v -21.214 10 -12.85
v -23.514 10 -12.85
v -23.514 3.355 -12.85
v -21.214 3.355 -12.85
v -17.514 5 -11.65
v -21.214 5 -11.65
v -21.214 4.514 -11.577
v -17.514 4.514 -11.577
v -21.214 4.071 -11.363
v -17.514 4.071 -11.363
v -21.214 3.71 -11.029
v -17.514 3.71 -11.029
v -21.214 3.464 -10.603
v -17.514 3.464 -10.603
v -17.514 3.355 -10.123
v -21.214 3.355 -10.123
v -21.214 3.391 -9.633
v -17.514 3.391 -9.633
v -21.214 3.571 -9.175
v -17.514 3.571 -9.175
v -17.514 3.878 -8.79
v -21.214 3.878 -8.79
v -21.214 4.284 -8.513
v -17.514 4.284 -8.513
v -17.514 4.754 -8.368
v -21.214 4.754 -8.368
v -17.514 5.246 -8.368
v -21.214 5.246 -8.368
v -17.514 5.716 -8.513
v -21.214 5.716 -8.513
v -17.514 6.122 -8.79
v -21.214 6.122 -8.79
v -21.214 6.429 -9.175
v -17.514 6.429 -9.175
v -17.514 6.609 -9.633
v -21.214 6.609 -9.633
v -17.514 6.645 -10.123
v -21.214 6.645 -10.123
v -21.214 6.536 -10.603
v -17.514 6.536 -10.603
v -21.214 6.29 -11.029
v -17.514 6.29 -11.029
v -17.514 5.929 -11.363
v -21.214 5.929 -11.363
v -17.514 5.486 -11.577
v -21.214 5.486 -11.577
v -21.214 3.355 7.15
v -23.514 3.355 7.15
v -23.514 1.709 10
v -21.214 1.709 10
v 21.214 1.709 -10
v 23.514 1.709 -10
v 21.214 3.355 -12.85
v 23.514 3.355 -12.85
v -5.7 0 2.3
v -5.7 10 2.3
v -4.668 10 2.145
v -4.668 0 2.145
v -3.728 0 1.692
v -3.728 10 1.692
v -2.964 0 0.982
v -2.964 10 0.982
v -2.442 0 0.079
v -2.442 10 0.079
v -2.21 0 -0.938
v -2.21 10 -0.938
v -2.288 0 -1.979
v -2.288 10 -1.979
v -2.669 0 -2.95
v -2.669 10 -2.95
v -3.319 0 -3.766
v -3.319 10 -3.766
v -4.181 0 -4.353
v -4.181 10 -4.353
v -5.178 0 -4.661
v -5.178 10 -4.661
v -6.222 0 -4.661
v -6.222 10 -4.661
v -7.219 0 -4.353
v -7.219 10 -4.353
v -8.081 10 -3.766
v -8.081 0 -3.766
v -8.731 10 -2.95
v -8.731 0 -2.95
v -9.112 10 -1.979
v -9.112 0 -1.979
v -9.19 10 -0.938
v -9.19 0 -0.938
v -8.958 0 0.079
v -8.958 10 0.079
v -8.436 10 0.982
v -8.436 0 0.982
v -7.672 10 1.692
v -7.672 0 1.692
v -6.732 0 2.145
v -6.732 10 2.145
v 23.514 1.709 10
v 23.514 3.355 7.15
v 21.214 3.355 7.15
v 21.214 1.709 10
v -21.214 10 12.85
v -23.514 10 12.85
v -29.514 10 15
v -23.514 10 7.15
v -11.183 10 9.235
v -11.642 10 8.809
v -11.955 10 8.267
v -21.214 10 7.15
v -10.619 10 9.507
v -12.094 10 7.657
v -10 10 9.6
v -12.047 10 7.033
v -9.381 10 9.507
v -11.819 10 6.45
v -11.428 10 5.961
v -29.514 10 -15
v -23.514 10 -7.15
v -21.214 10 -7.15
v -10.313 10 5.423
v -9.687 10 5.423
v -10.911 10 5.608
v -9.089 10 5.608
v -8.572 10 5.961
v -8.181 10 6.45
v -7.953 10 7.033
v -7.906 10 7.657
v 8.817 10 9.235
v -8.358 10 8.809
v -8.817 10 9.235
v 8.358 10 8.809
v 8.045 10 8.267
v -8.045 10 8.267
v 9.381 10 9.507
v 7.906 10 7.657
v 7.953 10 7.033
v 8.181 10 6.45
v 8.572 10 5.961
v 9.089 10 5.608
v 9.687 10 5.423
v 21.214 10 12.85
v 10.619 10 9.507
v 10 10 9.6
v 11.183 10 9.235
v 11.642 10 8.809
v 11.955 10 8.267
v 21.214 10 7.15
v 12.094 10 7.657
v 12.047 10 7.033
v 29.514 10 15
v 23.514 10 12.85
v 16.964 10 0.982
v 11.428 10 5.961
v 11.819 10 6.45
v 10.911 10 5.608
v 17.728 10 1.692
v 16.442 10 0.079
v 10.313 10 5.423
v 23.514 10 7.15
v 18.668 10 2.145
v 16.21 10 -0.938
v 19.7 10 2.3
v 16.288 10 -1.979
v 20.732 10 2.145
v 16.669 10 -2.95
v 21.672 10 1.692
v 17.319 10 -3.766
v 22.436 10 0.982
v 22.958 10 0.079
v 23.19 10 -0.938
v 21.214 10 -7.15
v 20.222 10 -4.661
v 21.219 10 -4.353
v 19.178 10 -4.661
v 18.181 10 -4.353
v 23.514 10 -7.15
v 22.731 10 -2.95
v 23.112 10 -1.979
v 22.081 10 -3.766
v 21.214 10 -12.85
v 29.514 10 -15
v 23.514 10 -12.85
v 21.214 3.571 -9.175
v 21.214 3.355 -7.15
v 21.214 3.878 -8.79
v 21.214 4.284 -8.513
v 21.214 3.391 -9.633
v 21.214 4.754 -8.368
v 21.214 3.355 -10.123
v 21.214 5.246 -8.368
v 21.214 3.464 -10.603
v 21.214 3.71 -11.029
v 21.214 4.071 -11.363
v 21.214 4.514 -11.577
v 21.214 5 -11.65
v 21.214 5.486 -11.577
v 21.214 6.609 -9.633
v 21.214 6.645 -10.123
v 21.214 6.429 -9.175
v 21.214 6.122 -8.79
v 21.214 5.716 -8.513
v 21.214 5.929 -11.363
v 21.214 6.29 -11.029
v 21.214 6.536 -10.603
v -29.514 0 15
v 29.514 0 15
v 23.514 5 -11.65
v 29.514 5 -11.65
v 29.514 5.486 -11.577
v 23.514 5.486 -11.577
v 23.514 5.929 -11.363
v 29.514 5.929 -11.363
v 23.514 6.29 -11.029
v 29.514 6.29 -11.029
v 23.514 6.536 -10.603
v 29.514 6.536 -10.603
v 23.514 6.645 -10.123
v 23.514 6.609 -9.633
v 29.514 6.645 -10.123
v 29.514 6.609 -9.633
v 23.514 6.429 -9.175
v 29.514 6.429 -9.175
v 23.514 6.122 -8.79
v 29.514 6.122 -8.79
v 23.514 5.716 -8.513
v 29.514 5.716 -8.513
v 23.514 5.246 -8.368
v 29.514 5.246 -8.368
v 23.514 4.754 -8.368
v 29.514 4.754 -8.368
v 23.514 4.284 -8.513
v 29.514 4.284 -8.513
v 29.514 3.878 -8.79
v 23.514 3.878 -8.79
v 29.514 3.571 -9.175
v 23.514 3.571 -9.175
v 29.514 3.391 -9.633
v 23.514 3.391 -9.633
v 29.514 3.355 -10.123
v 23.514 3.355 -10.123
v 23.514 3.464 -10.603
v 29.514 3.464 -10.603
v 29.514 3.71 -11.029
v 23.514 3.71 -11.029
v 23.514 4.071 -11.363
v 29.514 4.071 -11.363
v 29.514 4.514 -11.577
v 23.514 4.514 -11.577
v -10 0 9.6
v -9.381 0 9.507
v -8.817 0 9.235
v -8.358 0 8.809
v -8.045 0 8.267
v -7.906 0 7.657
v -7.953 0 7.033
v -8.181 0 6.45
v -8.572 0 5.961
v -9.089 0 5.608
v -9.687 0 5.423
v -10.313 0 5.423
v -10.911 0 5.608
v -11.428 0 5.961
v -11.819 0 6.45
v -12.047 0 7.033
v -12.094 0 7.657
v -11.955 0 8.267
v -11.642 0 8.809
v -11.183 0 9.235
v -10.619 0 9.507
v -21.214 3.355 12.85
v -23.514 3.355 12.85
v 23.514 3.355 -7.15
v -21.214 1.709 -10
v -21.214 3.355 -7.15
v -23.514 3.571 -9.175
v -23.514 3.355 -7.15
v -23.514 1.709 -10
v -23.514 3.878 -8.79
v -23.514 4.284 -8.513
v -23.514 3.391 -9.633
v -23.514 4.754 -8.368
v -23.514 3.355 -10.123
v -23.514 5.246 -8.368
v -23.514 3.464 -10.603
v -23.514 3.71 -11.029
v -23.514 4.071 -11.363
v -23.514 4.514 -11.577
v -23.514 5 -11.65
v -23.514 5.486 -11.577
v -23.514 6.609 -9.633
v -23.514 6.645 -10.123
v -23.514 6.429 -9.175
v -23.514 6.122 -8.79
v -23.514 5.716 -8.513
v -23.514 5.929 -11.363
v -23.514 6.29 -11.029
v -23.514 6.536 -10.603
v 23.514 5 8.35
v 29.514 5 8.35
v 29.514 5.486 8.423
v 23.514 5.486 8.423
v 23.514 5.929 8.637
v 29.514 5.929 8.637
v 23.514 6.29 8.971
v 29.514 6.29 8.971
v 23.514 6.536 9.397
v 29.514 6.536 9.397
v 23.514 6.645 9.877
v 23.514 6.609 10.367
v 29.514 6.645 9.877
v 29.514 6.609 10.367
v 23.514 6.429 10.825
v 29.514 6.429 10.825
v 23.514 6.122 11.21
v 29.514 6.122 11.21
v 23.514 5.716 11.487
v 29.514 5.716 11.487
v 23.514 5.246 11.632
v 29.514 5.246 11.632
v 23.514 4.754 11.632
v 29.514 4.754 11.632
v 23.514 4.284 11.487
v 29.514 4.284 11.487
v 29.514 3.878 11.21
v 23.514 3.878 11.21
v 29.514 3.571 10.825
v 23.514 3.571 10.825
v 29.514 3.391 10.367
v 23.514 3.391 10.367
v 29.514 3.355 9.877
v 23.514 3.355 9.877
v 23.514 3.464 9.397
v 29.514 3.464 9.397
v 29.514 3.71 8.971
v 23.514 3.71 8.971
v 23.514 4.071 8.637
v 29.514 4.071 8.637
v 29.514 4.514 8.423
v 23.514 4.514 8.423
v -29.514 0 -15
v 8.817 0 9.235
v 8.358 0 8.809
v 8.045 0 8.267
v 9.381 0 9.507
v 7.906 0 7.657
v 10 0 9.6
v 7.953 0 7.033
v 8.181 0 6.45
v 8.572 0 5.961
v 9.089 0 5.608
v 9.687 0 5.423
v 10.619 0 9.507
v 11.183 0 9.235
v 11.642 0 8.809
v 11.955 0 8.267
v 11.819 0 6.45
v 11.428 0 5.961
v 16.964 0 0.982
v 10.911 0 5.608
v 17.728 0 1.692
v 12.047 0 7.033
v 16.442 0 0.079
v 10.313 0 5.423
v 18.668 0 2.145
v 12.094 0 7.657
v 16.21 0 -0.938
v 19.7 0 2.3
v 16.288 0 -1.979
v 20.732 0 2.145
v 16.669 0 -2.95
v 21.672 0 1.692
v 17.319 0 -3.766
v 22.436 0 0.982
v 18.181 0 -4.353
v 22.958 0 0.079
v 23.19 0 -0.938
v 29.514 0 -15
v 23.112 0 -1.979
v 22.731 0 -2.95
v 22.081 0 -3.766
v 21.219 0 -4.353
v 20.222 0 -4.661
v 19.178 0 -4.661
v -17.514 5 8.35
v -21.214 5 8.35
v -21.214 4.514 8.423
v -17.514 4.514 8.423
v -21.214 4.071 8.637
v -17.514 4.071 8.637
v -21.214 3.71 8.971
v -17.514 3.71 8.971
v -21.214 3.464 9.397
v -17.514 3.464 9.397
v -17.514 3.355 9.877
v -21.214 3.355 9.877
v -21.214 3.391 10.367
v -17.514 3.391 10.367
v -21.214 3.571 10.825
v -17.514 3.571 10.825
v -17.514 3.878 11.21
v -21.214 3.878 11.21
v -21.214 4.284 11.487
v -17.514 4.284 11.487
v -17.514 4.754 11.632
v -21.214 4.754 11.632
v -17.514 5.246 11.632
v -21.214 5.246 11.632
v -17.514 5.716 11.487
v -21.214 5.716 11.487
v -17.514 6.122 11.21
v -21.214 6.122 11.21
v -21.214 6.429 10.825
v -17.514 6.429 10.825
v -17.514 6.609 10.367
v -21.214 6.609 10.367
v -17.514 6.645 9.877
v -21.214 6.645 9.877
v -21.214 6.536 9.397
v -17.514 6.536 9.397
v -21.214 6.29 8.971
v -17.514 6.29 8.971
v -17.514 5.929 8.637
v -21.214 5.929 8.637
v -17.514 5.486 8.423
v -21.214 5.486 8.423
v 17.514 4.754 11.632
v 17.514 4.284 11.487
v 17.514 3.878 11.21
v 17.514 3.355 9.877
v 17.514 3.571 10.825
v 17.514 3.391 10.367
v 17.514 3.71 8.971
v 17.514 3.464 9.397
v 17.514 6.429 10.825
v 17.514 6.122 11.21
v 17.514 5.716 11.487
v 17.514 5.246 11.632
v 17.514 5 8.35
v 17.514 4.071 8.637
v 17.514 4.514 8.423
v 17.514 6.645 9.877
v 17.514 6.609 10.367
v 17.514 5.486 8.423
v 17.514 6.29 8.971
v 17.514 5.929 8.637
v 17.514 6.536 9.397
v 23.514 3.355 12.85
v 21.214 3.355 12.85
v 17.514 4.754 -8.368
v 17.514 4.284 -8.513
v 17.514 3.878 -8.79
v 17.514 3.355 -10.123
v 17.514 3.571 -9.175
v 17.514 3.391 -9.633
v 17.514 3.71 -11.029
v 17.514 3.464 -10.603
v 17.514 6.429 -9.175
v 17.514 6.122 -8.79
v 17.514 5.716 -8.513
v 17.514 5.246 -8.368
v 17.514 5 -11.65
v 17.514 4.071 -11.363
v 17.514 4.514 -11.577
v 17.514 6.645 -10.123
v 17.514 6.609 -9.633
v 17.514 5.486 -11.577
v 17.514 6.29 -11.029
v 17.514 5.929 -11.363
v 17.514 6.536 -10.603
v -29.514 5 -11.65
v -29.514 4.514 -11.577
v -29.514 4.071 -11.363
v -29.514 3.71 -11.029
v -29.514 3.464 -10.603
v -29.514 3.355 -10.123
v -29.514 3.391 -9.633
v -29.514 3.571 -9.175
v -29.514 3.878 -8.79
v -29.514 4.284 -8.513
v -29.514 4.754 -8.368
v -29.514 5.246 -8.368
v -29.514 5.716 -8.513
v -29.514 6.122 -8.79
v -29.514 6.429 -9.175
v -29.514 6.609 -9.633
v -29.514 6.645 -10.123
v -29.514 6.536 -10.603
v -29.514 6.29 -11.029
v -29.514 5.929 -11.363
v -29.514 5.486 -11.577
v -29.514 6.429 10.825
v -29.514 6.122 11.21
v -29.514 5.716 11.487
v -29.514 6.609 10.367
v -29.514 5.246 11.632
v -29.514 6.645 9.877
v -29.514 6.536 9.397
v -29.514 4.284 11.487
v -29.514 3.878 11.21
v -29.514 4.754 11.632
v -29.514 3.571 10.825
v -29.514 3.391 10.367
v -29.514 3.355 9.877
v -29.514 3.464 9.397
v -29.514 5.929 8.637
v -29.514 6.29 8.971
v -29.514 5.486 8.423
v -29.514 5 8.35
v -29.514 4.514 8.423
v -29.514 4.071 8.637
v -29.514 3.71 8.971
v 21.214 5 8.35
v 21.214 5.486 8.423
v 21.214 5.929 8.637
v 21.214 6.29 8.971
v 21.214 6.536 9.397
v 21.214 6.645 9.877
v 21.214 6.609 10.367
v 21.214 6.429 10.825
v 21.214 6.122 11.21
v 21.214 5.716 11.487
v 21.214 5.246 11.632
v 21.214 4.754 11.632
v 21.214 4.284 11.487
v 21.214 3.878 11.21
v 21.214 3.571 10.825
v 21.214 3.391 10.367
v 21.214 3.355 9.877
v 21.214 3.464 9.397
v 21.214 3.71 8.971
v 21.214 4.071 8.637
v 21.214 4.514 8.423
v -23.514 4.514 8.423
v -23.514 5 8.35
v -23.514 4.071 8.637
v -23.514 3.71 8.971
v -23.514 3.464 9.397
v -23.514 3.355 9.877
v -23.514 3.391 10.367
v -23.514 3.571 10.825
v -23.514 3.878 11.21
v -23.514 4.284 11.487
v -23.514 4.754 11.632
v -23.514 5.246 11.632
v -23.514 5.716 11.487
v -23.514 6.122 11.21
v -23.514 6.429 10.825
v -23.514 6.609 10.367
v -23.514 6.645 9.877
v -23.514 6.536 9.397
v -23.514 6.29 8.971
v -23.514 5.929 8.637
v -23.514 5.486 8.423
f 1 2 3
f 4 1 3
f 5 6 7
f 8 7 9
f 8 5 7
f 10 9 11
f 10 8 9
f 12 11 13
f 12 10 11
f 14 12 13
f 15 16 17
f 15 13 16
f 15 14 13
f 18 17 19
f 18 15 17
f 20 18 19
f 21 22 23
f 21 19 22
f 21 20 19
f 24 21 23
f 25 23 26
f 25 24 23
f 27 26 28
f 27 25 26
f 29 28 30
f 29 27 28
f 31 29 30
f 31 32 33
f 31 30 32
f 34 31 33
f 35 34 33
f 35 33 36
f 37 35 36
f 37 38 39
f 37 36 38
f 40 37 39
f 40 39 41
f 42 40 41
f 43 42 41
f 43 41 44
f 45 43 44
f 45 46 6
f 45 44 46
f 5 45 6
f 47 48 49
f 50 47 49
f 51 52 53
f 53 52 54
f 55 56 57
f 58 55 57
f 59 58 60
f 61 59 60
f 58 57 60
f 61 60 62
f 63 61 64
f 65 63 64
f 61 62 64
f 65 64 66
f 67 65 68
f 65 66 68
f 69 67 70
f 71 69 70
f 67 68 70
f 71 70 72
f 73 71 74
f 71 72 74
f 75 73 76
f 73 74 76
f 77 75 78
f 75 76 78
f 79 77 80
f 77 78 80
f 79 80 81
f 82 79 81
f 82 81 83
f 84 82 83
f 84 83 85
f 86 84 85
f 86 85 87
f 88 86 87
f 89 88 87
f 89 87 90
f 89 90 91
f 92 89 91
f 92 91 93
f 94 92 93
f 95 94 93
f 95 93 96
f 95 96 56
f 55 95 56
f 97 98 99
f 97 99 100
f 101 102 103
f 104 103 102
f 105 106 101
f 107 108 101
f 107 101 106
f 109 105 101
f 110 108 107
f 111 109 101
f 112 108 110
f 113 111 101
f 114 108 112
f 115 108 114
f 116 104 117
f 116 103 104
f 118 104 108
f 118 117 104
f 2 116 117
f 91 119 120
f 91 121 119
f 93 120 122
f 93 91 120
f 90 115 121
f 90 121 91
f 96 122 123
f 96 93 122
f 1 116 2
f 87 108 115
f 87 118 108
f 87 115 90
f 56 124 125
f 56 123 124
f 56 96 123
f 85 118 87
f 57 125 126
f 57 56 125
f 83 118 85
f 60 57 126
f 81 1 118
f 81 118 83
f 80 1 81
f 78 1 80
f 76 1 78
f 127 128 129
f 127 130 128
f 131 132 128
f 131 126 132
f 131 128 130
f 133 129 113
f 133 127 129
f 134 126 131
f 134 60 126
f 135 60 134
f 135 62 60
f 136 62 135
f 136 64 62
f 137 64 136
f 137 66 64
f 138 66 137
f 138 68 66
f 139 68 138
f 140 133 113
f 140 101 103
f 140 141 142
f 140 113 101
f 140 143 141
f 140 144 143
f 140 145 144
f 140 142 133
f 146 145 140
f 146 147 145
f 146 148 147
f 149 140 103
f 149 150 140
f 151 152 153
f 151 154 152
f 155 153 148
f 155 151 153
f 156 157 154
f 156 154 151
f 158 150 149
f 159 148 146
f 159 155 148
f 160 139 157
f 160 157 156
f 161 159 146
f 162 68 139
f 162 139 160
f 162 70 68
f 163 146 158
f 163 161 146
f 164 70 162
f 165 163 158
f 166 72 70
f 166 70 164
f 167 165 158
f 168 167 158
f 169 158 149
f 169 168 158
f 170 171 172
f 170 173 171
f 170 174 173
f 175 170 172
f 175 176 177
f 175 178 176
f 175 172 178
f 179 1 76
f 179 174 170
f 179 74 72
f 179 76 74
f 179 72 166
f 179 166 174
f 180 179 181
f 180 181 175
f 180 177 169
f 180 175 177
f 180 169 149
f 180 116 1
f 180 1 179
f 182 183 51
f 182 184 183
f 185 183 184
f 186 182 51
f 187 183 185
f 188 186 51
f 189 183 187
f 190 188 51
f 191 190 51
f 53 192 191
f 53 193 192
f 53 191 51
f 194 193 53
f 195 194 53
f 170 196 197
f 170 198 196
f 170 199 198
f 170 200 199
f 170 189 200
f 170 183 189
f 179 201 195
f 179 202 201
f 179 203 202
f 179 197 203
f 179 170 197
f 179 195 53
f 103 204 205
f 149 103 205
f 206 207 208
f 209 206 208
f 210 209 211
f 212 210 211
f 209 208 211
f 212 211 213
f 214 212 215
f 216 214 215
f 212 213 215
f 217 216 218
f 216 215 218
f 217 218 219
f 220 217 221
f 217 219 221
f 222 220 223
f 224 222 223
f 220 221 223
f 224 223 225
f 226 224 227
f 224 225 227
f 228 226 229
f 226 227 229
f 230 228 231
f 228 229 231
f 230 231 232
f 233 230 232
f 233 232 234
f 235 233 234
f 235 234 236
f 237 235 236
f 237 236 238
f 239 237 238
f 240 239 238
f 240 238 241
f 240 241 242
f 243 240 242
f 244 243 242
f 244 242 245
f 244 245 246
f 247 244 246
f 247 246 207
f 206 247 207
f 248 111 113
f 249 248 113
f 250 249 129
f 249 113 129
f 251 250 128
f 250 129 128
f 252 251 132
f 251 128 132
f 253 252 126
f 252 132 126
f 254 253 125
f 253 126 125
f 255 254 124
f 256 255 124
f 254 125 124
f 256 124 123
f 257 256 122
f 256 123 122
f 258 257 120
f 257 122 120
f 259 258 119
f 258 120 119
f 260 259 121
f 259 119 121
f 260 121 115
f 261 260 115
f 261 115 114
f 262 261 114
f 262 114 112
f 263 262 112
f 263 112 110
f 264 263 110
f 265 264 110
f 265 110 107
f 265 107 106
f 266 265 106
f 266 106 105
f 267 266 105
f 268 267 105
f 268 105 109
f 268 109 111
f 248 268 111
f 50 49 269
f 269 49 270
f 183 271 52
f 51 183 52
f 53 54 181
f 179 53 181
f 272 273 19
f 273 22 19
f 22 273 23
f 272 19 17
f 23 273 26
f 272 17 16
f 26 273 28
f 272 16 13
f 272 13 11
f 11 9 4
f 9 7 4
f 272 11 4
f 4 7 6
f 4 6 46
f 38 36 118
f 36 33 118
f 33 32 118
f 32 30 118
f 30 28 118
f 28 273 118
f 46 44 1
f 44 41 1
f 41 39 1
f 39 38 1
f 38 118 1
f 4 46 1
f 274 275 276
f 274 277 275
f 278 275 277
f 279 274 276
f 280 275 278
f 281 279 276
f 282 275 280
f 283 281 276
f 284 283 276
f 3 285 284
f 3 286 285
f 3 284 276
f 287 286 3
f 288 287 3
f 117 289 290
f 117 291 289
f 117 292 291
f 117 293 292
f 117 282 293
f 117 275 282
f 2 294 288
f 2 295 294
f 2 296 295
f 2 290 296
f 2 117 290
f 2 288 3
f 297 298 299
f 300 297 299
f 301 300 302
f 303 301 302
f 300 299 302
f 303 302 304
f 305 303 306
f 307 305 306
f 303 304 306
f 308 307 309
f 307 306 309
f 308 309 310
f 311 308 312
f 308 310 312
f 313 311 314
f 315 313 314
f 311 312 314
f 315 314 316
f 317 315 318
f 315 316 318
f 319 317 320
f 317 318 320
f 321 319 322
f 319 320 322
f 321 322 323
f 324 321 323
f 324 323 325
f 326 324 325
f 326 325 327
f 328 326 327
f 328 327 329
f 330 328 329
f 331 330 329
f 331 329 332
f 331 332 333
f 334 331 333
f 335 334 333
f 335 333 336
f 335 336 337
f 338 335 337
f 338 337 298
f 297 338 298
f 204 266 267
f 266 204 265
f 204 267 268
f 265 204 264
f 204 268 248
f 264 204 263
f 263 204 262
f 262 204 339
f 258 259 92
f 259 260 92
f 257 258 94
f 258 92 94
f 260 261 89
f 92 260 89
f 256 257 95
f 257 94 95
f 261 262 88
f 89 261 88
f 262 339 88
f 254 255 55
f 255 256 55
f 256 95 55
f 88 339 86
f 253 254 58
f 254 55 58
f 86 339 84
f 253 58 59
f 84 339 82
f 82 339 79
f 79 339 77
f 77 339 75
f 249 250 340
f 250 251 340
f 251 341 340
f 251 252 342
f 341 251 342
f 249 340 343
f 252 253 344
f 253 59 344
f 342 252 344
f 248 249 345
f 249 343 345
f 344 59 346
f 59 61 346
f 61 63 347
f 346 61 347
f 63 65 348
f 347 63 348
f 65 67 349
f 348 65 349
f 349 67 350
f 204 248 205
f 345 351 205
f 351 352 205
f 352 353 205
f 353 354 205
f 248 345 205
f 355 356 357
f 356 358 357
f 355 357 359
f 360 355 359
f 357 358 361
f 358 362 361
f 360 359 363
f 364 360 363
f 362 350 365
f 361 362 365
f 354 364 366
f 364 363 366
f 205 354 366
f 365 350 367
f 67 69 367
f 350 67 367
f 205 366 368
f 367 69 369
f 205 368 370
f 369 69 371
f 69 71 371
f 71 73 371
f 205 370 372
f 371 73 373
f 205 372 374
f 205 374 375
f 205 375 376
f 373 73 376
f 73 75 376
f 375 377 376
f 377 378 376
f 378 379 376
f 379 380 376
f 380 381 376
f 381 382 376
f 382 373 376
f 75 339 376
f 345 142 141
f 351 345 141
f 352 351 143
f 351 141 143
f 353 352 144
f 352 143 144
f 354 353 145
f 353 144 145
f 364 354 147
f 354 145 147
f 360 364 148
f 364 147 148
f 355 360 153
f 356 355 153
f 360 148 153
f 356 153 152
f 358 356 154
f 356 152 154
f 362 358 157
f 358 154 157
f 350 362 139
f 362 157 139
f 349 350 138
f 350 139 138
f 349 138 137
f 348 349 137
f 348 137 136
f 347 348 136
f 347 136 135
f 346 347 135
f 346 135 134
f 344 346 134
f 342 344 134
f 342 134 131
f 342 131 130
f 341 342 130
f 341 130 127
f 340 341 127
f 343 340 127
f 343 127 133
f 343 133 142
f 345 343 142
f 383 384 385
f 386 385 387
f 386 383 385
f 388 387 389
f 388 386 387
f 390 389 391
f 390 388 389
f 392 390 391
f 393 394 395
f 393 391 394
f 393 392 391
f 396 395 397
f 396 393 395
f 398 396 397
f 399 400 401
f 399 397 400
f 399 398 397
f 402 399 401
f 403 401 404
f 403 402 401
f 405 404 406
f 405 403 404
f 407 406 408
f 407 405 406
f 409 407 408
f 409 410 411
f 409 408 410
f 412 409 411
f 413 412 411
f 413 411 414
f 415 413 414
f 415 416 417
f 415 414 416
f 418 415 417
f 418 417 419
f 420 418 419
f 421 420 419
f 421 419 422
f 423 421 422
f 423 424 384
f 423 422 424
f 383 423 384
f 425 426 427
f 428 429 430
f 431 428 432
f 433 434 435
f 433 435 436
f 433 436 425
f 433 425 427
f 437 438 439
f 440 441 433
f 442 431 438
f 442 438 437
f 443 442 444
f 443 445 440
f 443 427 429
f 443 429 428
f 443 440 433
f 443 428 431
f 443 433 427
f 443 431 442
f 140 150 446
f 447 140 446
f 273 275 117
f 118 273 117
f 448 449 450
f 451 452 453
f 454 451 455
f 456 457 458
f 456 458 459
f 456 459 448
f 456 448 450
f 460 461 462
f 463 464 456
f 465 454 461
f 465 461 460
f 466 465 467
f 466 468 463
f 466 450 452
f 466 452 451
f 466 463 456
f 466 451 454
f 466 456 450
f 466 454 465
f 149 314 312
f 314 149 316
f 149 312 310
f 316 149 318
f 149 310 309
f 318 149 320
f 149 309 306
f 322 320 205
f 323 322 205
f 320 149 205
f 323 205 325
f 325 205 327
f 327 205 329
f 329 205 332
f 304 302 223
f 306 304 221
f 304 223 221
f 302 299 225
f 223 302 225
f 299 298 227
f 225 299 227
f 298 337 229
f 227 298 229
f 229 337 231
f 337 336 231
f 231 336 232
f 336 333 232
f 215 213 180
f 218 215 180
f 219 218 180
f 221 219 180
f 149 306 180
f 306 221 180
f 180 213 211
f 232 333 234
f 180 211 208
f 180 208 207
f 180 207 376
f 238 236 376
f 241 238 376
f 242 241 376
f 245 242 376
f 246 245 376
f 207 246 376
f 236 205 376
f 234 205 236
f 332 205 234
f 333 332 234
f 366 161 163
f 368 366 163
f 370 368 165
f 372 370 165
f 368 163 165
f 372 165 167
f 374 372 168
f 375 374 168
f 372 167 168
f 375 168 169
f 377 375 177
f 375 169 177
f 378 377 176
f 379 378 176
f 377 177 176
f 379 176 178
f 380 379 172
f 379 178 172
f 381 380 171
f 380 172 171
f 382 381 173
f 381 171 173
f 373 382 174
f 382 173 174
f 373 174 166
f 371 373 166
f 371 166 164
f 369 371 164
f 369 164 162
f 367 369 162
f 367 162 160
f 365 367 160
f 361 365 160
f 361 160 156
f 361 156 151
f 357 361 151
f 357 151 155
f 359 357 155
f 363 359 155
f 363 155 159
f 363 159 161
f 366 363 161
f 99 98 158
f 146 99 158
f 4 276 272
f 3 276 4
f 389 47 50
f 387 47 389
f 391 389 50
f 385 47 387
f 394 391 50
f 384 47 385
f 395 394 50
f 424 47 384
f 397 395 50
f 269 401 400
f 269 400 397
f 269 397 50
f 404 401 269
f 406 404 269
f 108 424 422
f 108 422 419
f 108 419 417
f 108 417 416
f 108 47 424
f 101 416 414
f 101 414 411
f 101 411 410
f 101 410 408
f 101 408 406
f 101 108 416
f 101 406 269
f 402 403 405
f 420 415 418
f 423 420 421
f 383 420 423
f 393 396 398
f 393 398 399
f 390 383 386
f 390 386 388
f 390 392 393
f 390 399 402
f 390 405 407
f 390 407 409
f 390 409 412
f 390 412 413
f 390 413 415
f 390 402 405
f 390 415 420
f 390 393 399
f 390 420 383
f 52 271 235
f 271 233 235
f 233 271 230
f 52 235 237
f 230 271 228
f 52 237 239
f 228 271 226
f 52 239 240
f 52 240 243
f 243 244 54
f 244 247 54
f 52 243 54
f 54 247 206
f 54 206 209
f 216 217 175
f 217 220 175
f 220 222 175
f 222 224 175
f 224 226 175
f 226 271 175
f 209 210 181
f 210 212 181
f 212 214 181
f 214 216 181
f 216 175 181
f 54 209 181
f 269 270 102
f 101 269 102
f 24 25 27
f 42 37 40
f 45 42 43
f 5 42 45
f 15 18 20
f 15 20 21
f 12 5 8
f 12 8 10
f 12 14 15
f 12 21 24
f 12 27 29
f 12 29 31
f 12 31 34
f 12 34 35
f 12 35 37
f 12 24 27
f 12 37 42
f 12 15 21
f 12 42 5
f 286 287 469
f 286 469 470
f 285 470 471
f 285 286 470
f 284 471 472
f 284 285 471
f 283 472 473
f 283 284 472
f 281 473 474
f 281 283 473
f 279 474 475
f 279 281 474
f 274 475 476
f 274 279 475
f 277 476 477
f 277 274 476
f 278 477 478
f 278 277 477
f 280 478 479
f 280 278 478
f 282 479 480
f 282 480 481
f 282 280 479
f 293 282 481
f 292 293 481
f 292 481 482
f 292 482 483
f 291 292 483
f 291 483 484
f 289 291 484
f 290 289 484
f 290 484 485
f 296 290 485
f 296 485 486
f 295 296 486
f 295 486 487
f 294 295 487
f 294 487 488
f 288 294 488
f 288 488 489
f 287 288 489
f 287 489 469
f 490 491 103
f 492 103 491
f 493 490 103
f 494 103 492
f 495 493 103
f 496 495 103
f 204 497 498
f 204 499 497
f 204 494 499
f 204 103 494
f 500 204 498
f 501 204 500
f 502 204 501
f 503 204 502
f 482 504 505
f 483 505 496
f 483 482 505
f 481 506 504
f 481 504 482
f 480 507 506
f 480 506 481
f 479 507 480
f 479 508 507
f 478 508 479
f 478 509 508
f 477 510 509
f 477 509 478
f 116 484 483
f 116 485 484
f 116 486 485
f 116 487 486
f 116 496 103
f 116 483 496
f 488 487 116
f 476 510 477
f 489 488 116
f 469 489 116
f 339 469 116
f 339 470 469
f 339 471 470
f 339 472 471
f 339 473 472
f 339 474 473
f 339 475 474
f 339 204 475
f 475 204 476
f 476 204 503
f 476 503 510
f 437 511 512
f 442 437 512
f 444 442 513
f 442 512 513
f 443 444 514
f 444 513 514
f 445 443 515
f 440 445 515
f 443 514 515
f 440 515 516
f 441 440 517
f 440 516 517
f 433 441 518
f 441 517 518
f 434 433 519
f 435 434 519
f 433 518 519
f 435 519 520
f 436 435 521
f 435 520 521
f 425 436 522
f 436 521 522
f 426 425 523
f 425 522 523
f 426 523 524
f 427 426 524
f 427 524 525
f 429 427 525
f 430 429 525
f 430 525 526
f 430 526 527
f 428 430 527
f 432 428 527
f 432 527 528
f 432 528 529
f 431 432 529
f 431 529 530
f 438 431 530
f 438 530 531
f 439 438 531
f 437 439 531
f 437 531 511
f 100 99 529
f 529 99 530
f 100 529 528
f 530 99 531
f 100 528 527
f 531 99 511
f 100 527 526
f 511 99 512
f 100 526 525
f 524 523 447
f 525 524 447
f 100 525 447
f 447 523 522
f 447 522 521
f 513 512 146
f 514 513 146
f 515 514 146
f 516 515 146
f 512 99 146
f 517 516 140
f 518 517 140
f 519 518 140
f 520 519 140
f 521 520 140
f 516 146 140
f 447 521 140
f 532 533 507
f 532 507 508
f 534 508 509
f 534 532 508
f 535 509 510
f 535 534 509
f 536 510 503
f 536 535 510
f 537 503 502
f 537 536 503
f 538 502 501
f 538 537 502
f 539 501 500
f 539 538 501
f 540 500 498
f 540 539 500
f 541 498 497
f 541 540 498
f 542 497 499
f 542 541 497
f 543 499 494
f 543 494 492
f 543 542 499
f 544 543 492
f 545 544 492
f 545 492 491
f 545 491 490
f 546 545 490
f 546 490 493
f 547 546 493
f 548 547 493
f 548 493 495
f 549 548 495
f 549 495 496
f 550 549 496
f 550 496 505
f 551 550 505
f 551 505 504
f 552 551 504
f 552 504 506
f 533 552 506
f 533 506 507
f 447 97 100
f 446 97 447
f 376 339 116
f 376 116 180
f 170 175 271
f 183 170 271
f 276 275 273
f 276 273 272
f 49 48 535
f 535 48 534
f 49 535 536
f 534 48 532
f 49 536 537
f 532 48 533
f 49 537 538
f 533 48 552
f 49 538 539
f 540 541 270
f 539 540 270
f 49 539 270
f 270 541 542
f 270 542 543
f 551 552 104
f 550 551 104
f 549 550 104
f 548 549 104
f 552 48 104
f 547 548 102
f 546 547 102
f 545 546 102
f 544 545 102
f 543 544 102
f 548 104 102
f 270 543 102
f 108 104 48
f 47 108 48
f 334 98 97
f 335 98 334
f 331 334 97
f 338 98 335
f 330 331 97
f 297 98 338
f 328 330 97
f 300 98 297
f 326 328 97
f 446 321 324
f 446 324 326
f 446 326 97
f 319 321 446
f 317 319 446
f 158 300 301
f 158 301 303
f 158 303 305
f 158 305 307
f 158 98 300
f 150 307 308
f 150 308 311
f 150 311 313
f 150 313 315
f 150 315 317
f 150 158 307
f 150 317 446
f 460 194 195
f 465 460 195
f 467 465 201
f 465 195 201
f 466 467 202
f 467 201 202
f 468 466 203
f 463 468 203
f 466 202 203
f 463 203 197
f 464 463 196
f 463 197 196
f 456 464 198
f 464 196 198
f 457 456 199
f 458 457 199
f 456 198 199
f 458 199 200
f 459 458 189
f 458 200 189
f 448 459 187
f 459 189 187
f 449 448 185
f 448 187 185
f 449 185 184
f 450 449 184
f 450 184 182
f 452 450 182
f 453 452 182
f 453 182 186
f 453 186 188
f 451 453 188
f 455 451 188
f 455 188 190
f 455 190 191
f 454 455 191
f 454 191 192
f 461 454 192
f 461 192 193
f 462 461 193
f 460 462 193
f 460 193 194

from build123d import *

# Parameters (mm, degrees)
SKETCH1_W           = 59.0272
SKETCH1_H           = 30
BOSS_EXTRUDE1_DEPTH = 10
SKETCH2_R           = 2.1
CUT_EXTRUDE1_DEPTH  = 35.58399319
SKETCH3_R           = 1.65
CUT_EXTRUDE2_DEPTH  = 12
CUT_EXTRUDE3_START  = -12
SKETCH4_R           = 1.65
CUT_EXTRUDE3_DEPTH  = 12
CUT_EXTRUDE4_DEPTH  = 2.3
CUT_EXTRUDE5_DEPTH  = 2.3
SKETCH7_R           = 3.5
CUT_EXTRUDE6_DEPTH  = 35.58399319


with BuildPart() as part:
    # Sketch1 → Boss-Extrude1 (new body)
    with BuildSketch(Plane(origin=(0, 0, 0), x_dir=(1, 0, 0), z_dir=(0, 1, 0))):
        Rectangle(SKETCH1_W, SKETCH1_H)
    extrude(amount=BOSS_EXTRUDE1_DEPTH)

    # Sketch2 → Cut-Extrude1 (cut, through all)
    with BuildSketch(Plane(origin=(0, 10, 0), x_dir=(1, 0, 0), z_dir=(0, 1, 0))):
        with Locations(Location((-10, -7.5, 0), (0, 0, 270))):
            Circle(SKETCH2_R)
        with Locations(Location((10, -7.5, 0), (0, 0, 270))):
            Circle(SKETCH2_R)
    extrude(amount=-CUT_EXTRUDE1_DEPTH, mode=Mode.SUBTRACT)

    # Sketch3 → Cut-Extrude2 (cut)
    with BuildSketch(Plane(origin=(29.5136, 0, 0), x_dir=(0, 0, -1), z_dir=(1, 0, 0))):
        with Locations((-10, 5)):
            Circle(SKETCH3_R)
        with Locations((10, 5)):
            Circle(SKETCH3_R)
    extrude(amount=-CUT_EXTRUDE2_DEPTH, mode=Mode.SUBTRACT)

    # Sketch4 → Cut-Extrude3 (cut)
    with BuildSketch(Plane.ZY.offset(29.5136).offset(CUT_EXTRUDE3_START)):
        with Locations(Location((-10, 5, 0), (0, 0, 180))):
            Circle(SKETCH4_R)
        with Locations(Location((10, 5, 0), (0, 0, 180))):
            Circle(SKETCH4_R)
    extrude(amount=CUT_EXTRUDE3_DEPTH, mode=Mode.SUBTRACT)

    # Sketch5 → Cut-Extrude4 (cut)
    with BuildSketch(Plane(origin=(23.5136, 0, 0), x_dir=(0, 0, -1), z_dir=(1, 0, 0))):
        Polygon((-12.85, 6.645448267), (-12.85, 10), (-7.15, 10), (-7.15, 6.645448267), (-7.15, 3.354551733), (-10, 1.709103466), (-12.85, 3.354551733), align=None)
        Polygon((7.15, 6.645448267), (7.15, 3.354551733), (10, 1.709103466), (12.85, 3.354551733), (12.85, 6.645448267), (12.85, 10), (7.15, 10), align=None)
    extrude(amount=-CUT_EXTRUDE4_DEPTH, mode=Mode.SUBTRACT)

    # Sketch6 → Cut-Extrude5 (cut)
    with BuildSketch(Plane.ZY.offset(23.5136)):
        Polygon((-12.85, 6.645448267), (-12.85, 10), (-7.15, 10), (-7.15, 6.645448267), (-7.15, 3.354551733), (-10, 1.709103466), (-12.85, 3.354551733), align=None)
        Polygon((7.15, 6.645448267), (7.15, 3.354551733), (10, 1.709103466), (12.85, 3.354551733), (12.85, 6.645448267), (12.85, 10), (7.15, 10), align=None)
    extrude(amount=-CUT_EXTRUDE5_DEPTH, mode=Mode.SUBTRACT)

    # Sketch7 → Cut-Extrude6 (cut, through all)
    with BuildSketch(Plane(origin=(0, 10, 0), x_dir=(1, 0, 0), z_dir=(0, 1, 0))):
        with Locations(Location((19.7, 1.2, 0), (0, 0, 270))):
            Circle(SKETCH7_R)
        with Locations(Location((-5.7, 1.2, 0), (0, 0, 270))):
            Circle(SKETCH7_R)
    extrude(amount=-CUT_EXTRUDE6_DEPTH, mode=Mode.SUBTRACT)


solid = part.part
